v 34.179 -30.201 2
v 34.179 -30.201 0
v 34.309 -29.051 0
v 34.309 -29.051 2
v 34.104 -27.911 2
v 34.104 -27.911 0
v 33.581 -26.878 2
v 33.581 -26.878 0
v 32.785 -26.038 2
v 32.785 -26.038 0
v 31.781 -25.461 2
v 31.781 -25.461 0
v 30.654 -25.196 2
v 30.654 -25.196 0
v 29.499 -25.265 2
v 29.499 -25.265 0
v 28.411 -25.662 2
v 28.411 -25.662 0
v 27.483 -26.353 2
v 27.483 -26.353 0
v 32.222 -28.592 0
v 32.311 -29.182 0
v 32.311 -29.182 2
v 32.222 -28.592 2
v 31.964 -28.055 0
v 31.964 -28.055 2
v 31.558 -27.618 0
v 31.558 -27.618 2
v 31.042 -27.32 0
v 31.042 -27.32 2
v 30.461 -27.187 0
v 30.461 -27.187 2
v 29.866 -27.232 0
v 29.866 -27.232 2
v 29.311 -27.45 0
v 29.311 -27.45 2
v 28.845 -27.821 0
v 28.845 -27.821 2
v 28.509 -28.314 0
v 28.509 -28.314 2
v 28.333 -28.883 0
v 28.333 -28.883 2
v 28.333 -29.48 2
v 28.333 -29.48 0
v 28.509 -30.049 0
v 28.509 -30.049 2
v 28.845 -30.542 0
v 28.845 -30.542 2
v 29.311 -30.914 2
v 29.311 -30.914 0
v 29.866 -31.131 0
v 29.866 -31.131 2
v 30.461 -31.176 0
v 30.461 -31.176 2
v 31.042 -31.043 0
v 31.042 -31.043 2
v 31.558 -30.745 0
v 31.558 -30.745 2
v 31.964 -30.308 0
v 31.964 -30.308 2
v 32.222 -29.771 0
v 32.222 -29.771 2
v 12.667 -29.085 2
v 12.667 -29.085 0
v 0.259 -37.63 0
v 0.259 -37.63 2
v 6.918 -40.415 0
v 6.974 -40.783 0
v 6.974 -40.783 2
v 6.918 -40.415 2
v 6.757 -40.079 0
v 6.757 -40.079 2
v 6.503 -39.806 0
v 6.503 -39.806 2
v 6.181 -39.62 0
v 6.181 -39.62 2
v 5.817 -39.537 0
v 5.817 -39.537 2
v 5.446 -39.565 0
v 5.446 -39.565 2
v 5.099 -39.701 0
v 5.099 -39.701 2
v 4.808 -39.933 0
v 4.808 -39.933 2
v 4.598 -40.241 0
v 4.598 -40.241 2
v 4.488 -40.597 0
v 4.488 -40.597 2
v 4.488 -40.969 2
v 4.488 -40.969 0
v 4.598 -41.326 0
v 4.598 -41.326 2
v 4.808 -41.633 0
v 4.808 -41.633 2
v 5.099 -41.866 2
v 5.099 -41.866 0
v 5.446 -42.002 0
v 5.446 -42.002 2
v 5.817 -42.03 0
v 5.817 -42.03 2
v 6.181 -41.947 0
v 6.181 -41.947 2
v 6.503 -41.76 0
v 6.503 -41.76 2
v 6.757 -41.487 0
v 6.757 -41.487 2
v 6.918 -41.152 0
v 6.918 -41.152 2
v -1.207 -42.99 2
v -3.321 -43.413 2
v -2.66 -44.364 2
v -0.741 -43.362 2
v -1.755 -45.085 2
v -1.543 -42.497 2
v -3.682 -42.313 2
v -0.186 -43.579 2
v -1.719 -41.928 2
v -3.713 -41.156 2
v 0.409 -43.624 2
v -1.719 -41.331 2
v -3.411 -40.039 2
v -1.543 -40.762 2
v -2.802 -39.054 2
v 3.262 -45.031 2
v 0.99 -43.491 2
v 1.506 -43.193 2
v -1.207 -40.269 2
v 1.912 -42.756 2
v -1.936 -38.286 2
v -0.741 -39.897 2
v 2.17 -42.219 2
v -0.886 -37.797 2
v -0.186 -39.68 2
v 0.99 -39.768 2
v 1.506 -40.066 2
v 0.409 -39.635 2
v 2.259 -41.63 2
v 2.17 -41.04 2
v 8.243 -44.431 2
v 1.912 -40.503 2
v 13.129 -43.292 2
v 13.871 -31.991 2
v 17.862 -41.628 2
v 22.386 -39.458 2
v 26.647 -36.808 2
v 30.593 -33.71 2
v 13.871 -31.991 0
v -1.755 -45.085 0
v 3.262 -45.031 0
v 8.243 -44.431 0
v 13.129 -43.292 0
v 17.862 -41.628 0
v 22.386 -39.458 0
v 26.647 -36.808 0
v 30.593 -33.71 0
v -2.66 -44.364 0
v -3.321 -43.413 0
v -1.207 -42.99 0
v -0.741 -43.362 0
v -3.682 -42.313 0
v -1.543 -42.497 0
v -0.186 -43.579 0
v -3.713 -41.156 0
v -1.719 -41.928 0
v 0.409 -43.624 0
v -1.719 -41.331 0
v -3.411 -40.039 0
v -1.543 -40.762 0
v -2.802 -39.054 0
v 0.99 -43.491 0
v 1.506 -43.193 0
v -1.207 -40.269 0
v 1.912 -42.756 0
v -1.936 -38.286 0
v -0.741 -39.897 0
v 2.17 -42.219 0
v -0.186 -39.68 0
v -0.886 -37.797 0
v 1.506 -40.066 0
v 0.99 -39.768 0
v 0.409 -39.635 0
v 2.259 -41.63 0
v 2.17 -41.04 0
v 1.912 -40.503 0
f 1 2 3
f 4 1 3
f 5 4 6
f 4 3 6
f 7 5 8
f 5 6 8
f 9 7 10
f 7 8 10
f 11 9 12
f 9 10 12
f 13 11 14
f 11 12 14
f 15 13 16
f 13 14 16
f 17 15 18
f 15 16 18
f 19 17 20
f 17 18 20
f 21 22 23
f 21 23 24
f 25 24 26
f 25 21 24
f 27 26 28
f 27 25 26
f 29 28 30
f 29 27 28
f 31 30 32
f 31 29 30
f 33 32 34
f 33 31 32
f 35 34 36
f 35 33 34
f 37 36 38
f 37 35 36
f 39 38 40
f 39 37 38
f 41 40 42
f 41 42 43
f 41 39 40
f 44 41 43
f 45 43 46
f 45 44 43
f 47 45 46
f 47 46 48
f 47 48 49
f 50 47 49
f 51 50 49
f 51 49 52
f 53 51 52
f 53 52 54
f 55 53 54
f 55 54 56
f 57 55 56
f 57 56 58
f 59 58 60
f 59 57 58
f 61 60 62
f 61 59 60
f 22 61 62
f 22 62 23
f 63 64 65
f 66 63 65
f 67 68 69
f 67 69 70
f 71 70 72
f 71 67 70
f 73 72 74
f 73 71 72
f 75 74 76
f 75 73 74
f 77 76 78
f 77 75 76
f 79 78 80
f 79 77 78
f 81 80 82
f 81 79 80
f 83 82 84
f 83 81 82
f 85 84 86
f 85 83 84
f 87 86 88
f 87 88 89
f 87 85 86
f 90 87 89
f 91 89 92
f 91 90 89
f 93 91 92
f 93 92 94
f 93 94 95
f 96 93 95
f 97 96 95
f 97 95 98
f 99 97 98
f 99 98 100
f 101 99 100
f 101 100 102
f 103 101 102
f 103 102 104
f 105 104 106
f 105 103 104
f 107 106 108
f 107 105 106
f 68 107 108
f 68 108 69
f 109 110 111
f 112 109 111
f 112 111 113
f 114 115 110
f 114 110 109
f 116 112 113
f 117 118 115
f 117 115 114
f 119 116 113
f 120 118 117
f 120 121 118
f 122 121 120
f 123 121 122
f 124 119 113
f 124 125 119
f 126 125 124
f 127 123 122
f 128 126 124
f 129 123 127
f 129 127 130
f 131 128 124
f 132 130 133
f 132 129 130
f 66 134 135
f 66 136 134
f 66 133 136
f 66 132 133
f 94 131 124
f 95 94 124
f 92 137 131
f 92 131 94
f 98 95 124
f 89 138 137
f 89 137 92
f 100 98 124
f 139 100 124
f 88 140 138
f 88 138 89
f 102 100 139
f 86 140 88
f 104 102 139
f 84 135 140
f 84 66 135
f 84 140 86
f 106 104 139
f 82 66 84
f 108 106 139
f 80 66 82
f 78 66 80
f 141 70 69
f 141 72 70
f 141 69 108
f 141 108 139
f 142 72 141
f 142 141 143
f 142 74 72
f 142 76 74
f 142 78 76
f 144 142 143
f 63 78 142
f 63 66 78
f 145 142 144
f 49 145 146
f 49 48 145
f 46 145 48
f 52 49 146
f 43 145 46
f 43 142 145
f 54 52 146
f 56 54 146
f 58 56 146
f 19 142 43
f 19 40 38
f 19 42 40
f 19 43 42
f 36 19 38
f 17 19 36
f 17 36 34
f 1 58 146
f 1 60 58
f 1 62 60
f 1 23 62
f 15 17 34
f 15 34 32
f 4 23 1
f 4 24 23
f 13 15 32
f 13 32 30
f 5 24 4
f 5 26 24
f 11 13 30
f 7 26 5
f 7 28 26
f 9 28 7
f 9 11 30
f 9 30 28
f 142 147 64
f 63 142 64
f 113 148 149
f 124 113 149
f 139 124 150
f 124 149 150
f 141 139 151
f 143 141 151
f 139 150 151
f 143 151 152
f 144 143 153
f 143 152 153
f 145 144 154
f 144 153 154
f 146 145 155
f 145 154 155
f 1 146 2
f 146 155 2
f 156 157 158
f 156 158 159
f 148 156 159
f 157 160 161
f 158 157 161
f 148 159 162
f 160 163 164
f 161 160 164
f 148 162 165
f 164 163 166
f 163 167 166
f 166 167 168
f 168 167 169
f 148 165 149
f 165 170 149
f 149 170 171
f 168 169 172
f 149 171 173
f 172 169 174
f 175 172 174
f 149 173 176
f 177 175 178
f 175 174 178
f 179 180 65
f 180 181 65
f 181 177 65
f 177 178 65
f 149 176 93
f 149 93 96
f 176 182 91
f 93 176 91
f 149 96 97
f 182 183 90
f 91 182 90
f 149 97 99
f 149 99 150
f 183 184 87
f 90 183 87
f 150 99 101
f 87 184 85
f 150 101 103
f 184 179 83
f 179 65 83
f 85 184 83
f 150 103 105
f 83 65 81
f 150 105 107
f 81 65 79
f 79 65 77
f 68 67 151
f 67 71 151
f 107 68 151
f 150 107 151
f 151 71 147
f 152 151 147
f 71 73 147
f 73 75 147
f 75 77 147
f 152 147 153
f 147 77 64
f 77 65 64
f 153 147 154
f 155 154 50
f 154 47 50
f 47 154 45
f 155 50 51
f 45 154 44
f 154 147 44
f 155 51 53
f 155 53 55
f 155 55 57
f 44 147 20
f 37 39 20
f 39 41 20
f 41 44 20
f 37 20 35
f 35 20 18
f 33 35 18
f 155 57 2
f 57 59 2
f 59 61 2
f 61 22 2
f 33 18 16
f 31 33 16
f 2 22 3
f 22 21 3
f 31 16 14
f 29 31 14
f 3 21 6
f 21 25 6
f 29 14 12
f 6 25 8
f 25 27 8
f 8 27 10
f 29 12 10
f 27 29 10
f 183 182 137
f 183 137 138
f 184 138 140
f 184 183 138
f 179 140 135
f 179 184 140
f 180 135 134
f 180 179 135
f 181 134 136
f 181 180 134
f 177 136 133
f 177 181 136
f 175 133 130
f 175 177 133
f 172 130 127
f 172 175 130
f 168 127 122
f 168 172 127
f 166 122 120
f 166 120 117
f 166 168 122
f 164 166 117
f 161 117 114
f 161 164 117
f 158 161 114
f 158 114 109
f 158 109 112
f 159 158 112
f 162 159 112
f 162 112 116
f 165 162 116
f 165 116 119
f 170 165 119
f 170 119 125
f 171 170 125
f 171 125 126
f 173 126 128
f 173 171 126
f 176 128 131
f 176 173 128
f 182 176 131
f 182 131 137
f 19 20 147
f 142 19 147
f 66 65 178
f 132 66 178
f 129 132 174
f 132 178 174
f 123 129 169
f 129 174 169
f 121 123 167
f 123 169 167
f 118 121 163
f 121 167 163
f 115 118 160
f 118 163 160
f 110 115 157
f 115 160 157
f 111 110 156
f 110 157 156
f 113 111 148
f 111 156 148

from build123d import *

# Parameters (mm, degrees)
SKETCH_1_R      = 2
SKETCH_1_R_2    = 1.25
EXTRUDE_1_DEPTH = 2


with BuildPart() as part:
    # 草图1 → 凸台-拉伸1 (new body)
    with BuildSketch(Plane.XY):
        with BuildLine():
            Line((12.667014152, -29.085004895), (0.259047619, -37.62952381))
            ThreePointArc((0.259047619, -37.62952381), (-3.602527799, -40.586338642), (-1.755121481, -45.085406162))
            ThreePointArc((-1.755121481, -45.085406162), (17.862485508, -41.627982305), (34.178996295, -30.201007228))
            ThreePointArc((34.178996295, -30.201007228), (32.303988677, -25.71337254), (27.482658695, -26.353134885))
            Line((27.482658695, -26.353134885), (13.870853157, -31.991329347))
            Line((13.870853157, -31.991329347), (12.667014152, -29.085004895))
        make_face()
        with Locations((0.259047619, -41.62952381)):
            Circle(SKETCH_1_R, mode=Mode.SUBTRACT)
        with Locations((30.311085819, -29.18156201)):
            Circle(SKETCH_1_R, mode=Mode.SUBTRACT)
        with Locations((5.724004276, -40.783180011)):
            Circle(SKETCH_1_R_2, mode=Mode.SUBTRACT)
    extrude(amount=EXTRUDE_1_DEPTH)


solid = part.part
